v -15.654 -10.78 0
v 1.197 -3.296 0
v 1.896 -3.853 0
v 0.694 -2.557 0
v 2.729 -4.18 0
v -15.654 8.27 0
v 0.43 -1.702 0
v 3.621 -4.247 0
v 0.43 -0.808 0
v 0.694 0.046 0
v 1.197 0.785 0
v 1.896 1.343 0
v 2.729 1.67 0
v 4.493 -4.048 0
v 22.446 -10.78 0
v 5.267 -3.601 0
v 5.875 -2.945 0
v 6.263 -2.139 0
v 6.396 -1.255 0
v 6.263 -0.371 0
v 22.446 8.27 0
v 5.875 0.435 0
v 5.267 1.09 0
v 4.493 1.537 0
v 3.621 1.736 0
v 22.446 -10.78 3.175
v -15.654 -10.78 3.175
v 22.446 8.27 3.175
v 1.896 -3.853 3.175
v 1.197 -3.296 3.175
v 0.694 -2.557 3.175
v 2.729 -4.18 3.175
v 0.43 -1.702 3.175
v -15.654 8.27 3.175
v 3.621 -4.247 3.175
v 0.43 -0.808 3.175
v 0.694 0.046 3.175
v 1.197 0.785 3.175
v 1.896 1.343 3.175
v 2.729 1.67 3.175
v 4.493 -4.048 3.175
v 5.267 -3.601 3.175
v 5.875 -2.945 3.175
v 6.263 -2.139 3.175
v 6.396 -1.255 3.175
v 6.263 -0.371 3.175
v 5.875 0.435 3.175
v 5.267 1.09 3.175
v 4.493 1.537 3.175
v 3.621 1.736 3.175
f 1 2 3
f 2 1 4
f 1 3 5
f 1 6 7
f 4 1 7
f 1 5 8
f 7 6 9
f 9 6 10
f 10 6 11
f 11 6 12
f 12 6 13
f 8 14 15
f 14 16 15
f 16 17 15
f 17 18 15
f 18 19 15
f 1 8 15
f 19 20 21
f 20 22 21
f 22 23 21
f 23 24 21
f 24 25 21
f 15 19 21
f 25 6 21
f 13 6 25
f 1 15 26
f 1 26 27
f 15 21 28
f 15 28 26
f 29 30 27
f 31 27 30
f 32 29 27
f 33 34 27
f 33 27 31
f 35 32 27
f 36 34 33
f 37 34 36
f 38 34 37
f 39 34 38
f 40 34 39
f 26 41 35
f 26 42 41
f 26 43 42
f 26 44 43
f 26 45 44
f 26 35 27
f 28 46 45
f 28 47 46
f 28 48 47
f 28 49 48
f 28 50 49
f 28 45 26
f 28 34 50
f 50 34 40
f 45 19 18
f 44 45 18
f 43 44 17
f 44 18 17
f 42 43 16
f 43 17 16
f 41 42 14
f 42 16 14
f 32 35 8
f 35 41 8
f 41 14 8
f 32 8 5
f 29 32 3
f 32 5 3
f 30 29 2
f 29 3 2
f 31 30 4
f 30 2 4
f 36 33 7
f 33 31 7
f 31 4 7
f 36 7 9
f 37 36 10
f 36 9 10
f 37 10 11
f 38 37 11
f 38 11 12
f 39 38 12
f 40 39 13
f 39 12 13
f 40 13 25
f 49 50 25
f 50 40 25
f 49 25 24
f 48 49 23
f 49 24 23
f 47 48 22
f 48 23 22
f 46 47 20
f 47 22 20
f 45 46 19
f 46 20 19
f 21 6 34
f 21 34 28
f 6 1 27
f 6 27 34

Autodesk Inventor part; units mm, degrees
ref_plane "YZ Plane" through (0, 0, 0) normal (1, 0, 0) x (0, 1, 0)
ref_plane "XZ Plane" through (0, 0, 0) normal (0, 1, 0) x (-1, 0, 0)
ref_plane "XY Plane" through (0, 0, 0) normal (0, 0, 1) x (1, 0, 0)
sketch "Sketch1" plane through (0, 0, 0) normal (0, 0, 1) x (1, 0, 0)
  line L0 (-15.6535, 8.2698) -> (22.4465, 8.2698)
  line L1 (22.4465, 8.2698) -> (22.4465, -10.7802)
  line L2 (22.4465, -10.7802) -> (-15.6535, -10.7802)
  line L3 (-15.6535, -10.7802) -> (-15.6535, 8.2698)
  circle A0 centre (3.3965, -1.2552) radius 3
  point P0 (0, 0)
  dimension "d0" = 38.1
  dimension "d1" = 19.05
  dimension "d4" = 6
extrude "Extrusion1" add sketch "Sketch1" along normal blind 3.175 contours L0 L1 L2 L3 | A0
extrude "Extrusion2" cut sketch "Sketch1" along normal blind 3.175 contours A0
properties part number "CURM_Caterpillar_Tail"
